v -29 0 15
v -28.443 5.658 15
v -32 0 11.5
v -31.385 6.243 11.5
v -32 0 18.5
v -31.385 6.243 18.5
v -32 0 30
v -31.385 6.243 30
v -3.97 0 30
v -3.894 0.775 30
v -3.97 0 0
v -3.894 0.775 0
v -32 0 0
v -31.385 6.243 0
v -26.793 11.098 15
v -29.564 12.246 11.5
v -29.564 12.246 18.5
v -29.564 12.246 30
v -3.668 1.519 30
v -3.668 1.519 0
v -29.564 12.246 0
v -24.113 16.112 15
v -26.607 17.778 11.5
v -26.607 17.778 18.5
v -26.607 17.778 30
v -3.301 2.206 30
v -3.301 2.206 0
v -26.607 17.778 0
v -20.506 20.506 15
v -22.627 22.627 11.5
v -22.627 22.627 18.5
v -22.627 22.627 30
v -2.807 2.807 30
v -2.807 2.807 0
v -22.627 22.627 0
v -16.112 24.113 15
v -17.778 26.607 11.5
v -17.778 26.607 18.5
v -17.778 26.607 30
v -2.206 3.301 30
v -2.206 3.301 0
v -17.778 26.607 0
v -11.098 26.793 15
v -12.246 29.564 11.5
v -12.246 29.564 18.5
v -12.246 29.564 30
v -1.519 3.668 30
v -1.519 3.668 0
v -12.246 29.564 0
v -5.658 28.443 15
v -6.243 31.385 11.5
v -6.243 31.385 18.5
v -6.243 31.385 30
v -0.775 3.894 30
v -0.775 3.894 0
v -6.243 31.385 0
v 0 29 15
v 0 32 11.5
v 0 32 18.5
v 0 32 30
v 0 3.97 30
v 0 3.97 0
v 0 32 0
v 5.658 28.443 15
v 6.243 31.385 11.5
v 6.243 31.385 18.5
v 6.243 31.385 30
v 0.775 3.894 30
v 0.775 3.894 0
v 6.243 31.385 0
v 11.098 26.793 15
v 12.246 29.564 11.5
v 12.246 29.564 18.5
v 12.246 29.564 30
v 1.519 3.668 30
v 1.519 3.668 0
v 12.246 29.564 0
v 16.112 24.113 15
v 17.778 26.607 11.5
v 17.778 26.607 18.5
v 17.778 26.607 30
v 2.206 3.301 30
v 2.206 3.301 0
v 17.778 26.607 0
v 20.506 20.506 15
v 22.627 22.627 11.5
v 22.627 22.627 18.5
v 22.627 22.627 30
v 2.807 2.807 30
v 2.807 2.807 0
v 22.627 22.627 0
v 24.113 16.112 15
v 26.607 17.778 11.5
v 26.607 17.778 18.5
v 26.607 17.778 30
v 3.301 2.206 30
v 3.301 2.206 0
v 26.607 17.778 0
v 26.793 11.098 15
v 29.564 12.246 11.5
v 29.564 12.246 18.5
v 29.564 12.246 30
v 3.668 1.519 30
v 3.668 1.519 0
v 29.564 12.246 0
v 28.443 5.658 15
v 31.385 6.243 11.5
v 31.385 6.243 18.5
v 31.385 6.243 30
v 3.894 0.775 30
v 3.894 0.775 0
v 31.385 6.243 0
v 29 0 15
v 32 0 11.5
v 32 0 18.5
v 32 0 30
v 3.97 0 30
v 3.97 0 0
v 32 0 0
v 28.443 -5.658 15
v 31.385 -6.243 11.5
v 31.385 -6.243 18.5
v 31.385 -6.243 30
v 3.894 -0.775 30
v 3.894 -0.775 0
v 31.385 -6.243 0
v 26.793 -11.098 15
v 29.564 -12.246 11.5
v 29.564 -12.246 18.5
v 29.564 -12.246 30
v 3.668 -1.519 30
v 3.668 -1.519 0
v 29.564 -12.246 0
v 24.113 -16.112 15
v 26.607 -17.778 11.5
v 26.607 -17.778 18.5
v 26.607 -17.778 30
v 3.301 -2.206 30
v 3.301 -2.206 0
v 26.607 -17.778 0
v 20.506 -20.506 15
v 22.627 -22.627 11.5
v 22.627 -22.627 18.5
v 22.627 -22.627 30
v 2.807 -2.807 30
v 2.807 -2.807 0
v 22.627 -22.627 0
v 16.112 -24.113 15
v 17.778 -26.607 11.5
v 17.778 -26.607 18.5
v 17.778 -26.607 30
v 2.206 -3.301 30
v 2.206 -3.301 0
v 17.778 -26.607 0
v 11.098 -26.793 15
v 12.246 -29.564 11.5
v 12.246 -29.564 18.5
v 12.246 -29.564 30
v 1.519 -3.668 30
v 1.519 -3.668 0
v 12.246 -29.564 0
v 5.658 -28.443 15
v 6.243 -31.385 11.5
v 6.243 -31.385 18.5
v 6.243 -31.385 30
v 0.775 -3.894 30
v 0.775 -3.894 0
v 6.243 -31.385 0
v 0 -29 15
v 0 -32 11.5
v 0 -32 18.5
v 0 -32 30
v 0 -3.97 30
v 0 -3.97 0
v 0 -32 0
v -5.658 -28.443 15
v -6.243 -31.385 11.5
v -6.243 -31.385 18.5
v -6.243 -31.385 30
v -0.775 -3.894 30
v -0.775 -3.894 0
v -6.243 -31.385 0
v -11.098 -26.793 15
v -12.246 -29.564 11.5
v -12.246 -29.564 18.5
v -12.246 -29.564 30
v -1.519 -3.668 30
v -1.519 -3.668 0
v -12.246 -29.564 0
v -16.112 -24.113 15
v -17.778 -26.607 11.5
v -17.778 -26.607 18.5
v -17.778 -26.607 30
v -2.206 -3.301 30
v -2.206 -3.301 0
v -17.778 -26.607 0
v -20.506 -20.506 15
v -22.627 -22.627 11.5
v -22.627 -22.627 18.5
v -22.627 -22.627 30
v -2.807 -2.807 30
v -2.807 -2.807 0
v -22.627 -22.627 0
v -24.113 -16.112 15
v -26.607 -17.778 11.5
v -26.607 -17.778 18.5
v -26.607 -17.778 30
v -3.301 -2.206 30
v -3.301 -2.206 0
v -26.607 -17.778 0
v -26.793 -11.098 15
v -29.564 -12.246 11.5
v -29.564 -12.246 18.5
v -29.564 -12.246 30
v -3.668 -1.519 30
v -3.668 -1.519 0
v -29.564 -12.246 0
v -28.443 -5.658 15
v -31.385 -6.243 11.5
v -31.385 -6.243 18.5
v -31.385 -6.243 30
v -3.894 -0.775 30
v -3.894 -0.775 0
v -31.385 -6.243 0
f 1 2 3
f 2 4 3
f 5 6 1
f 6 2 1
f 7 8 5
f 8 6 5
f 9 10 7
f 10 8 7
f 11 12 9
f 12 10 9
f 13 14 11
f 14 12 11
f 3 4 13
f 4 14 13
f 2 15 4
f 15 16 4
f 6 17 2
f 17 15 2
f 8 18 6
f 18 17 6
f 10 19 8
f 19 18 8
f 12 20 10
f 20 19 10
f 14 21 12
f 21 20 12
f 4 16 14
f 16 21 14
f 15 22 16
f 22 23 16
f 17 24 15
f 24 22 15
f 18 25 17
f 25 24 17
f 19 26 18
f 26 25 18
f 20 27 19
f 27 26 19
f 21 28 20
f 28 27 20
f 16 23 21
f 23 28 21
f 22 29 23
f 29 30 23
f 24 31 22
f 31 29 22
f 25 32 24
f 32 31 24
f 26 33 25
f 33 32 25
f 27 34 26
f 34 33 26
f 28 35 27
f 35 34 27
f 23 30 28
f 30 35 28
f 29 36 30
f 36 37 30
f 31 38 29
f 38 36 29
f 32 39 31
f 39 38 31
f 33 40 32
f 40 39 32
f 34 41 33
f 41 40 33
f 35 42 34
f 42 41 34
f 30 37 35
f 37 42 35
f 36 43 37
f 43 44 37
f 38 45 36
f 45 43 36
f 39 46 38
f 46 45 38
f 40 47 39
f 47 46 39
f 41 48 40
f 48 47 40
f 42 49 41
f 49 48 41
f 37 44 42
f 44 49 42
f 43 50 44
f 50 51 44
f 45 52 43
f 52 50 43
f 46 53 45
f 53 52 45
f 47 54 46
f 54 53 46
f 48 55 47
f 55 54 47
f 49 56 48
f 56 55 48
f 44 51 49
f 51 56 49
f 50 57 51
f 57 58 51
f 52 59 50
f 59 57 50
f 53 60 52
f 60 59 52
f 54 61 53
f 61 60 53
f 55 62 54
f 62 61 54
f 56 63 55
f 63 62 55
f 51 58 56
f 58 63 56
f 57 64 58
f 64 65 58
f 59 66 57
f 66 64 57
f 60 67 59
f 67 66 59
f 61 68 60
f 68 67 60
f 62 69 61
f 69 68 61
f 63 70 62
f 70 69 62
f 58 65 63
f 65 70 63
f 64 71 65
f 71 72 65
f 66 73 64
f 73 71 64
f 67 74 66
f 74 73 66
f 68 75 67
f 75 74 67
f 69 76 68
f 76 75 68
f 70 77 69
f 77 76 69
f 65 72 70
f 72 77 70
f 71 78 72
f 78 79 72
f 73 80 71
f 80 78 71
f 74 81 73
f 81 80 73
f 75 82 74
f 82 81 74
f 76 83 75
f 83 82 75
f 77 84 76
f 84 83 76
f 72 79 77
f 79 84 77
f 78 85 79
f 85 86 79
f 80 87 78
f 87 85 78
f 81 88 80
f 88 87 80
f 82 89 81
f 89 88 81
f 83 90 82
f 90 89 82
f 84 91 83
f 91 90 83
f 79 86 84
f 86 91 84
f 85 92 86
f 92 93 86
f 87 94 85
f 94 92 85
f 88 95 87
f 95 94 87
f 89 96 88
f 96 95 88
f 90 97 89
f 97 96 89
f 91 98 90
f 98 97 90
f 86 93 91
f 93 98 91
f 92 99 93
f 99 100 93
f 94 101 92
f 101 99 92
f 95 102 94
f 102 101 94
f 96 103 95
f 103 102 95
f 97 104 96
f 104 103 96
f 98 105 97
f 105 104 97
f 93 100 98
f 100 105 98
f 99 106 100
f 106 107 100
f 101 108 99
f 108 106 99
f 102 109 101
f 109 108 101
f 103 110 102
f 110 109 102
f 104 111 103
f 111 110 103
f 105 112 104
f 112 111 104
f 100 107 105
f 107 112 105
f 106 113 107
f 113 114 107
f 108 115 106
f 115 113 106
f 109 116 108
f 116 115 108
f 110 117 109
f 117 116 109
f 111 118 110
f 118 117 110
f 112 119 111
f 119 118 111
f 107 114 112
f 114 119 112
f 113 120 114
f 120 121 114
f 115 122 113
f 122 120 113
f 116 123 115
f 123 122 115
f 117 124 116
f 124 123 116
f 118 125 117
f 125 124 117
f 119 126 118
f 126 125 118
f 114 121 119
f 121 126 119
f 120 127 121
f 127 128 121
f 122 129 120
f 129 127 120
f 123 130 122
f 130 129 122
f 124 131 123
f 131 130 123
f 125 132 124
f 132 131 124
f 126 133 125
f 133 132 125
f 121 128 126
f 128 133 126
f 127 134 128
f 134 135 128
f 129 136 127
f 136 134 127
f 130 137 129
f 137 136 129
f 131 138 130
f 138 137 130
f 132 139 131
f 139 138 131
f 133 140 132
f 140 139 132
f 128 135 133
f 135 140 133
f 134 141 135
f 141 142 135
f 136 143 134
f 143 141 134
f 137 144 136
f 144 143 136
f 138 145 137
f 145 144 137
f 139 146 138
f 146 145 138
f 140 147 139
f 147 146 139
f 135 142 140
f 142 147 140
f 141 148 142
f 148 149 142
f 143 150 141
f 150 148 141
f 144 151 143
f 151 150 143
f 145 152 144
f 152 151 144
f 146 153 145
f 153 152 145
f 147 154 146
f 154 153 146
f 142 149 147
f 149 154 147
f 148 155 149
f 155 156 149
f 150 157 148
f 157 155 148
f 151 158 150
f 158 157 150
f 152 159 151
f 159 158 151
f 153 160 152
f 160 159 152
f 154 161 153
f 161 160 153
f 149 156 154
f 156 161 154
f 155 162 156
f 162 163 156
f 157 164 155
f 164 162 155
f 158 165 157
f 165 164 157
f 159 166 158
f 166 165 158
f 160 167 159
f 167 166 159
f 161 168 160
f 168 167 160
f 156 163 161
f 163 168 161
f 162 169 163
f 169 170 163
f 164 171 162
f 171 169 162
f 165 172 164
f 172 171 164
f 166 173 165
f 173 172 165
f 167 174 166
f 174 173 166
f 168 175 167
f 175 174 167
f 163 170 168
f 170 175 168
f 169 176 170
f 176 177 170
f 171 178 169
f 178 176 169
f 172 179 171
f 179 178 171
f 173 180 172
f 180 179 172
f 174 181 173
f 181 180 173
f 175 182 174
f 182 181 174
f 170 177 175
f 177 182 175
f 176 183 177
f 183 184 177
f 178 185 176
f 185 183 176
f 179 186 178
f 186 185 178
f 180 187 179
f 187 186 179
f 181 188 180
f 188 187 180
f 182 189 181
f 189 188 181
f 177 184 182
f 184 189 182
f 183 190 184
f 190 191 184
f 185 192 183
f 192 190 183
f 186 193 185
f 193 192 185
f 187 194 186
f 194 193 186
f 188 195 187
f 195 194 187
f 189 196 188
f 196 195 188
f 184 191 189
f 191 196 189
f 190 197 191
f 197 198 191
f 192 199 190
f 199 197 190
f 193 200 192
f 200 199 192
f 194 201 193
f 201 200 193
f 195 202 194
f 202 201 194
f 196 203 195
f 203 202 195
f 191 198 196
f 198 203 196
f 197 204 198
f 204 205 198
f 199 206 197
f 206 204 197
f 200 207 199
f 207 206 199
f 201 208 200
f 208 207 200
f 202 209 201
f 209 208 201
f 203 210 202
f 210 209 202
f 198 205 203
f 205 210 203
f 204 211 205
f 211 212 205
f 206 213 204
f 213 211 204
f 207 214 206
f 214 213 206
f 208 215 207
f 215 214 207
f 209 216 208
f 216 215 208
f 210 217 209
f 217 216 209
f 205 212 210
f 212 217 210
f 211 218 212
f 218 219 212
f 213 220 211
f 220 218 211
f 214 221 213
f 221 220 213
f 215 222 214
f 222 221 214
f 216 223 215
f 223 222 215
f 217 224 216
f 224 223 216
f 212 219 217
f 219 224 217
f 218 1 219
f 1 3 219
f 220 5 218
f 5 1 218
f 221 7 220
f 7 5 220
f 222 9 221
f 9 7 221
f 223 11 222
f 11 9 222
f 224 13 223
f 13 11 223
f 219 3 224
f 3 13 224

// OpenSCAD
$fn = 32;

// ----------------------------------------------------------------------
// Belt roller: 64 mm barrel, 30 mm wide, bore 7.94 mm
// ----------------------------------------------------------------------

// --- parameters (mm) ---
bore_d = 7.94;            // bore
barrel_d = 64;            // barrel diameter
roller_w = 30;            // roller width
groove_w = 7;             // guide groove width
groove_d = 3;             // guide groove depth

roller_profile = [[3.97, 0], [32, 0], [32, 11.5], [29, 15], [32, 18.5], [32, 30], [3.97, 30]];

/* the profile stays clear of the axis, so the bore comes out of the revolve */
rotate_extrude() polygon(roller_profile);
